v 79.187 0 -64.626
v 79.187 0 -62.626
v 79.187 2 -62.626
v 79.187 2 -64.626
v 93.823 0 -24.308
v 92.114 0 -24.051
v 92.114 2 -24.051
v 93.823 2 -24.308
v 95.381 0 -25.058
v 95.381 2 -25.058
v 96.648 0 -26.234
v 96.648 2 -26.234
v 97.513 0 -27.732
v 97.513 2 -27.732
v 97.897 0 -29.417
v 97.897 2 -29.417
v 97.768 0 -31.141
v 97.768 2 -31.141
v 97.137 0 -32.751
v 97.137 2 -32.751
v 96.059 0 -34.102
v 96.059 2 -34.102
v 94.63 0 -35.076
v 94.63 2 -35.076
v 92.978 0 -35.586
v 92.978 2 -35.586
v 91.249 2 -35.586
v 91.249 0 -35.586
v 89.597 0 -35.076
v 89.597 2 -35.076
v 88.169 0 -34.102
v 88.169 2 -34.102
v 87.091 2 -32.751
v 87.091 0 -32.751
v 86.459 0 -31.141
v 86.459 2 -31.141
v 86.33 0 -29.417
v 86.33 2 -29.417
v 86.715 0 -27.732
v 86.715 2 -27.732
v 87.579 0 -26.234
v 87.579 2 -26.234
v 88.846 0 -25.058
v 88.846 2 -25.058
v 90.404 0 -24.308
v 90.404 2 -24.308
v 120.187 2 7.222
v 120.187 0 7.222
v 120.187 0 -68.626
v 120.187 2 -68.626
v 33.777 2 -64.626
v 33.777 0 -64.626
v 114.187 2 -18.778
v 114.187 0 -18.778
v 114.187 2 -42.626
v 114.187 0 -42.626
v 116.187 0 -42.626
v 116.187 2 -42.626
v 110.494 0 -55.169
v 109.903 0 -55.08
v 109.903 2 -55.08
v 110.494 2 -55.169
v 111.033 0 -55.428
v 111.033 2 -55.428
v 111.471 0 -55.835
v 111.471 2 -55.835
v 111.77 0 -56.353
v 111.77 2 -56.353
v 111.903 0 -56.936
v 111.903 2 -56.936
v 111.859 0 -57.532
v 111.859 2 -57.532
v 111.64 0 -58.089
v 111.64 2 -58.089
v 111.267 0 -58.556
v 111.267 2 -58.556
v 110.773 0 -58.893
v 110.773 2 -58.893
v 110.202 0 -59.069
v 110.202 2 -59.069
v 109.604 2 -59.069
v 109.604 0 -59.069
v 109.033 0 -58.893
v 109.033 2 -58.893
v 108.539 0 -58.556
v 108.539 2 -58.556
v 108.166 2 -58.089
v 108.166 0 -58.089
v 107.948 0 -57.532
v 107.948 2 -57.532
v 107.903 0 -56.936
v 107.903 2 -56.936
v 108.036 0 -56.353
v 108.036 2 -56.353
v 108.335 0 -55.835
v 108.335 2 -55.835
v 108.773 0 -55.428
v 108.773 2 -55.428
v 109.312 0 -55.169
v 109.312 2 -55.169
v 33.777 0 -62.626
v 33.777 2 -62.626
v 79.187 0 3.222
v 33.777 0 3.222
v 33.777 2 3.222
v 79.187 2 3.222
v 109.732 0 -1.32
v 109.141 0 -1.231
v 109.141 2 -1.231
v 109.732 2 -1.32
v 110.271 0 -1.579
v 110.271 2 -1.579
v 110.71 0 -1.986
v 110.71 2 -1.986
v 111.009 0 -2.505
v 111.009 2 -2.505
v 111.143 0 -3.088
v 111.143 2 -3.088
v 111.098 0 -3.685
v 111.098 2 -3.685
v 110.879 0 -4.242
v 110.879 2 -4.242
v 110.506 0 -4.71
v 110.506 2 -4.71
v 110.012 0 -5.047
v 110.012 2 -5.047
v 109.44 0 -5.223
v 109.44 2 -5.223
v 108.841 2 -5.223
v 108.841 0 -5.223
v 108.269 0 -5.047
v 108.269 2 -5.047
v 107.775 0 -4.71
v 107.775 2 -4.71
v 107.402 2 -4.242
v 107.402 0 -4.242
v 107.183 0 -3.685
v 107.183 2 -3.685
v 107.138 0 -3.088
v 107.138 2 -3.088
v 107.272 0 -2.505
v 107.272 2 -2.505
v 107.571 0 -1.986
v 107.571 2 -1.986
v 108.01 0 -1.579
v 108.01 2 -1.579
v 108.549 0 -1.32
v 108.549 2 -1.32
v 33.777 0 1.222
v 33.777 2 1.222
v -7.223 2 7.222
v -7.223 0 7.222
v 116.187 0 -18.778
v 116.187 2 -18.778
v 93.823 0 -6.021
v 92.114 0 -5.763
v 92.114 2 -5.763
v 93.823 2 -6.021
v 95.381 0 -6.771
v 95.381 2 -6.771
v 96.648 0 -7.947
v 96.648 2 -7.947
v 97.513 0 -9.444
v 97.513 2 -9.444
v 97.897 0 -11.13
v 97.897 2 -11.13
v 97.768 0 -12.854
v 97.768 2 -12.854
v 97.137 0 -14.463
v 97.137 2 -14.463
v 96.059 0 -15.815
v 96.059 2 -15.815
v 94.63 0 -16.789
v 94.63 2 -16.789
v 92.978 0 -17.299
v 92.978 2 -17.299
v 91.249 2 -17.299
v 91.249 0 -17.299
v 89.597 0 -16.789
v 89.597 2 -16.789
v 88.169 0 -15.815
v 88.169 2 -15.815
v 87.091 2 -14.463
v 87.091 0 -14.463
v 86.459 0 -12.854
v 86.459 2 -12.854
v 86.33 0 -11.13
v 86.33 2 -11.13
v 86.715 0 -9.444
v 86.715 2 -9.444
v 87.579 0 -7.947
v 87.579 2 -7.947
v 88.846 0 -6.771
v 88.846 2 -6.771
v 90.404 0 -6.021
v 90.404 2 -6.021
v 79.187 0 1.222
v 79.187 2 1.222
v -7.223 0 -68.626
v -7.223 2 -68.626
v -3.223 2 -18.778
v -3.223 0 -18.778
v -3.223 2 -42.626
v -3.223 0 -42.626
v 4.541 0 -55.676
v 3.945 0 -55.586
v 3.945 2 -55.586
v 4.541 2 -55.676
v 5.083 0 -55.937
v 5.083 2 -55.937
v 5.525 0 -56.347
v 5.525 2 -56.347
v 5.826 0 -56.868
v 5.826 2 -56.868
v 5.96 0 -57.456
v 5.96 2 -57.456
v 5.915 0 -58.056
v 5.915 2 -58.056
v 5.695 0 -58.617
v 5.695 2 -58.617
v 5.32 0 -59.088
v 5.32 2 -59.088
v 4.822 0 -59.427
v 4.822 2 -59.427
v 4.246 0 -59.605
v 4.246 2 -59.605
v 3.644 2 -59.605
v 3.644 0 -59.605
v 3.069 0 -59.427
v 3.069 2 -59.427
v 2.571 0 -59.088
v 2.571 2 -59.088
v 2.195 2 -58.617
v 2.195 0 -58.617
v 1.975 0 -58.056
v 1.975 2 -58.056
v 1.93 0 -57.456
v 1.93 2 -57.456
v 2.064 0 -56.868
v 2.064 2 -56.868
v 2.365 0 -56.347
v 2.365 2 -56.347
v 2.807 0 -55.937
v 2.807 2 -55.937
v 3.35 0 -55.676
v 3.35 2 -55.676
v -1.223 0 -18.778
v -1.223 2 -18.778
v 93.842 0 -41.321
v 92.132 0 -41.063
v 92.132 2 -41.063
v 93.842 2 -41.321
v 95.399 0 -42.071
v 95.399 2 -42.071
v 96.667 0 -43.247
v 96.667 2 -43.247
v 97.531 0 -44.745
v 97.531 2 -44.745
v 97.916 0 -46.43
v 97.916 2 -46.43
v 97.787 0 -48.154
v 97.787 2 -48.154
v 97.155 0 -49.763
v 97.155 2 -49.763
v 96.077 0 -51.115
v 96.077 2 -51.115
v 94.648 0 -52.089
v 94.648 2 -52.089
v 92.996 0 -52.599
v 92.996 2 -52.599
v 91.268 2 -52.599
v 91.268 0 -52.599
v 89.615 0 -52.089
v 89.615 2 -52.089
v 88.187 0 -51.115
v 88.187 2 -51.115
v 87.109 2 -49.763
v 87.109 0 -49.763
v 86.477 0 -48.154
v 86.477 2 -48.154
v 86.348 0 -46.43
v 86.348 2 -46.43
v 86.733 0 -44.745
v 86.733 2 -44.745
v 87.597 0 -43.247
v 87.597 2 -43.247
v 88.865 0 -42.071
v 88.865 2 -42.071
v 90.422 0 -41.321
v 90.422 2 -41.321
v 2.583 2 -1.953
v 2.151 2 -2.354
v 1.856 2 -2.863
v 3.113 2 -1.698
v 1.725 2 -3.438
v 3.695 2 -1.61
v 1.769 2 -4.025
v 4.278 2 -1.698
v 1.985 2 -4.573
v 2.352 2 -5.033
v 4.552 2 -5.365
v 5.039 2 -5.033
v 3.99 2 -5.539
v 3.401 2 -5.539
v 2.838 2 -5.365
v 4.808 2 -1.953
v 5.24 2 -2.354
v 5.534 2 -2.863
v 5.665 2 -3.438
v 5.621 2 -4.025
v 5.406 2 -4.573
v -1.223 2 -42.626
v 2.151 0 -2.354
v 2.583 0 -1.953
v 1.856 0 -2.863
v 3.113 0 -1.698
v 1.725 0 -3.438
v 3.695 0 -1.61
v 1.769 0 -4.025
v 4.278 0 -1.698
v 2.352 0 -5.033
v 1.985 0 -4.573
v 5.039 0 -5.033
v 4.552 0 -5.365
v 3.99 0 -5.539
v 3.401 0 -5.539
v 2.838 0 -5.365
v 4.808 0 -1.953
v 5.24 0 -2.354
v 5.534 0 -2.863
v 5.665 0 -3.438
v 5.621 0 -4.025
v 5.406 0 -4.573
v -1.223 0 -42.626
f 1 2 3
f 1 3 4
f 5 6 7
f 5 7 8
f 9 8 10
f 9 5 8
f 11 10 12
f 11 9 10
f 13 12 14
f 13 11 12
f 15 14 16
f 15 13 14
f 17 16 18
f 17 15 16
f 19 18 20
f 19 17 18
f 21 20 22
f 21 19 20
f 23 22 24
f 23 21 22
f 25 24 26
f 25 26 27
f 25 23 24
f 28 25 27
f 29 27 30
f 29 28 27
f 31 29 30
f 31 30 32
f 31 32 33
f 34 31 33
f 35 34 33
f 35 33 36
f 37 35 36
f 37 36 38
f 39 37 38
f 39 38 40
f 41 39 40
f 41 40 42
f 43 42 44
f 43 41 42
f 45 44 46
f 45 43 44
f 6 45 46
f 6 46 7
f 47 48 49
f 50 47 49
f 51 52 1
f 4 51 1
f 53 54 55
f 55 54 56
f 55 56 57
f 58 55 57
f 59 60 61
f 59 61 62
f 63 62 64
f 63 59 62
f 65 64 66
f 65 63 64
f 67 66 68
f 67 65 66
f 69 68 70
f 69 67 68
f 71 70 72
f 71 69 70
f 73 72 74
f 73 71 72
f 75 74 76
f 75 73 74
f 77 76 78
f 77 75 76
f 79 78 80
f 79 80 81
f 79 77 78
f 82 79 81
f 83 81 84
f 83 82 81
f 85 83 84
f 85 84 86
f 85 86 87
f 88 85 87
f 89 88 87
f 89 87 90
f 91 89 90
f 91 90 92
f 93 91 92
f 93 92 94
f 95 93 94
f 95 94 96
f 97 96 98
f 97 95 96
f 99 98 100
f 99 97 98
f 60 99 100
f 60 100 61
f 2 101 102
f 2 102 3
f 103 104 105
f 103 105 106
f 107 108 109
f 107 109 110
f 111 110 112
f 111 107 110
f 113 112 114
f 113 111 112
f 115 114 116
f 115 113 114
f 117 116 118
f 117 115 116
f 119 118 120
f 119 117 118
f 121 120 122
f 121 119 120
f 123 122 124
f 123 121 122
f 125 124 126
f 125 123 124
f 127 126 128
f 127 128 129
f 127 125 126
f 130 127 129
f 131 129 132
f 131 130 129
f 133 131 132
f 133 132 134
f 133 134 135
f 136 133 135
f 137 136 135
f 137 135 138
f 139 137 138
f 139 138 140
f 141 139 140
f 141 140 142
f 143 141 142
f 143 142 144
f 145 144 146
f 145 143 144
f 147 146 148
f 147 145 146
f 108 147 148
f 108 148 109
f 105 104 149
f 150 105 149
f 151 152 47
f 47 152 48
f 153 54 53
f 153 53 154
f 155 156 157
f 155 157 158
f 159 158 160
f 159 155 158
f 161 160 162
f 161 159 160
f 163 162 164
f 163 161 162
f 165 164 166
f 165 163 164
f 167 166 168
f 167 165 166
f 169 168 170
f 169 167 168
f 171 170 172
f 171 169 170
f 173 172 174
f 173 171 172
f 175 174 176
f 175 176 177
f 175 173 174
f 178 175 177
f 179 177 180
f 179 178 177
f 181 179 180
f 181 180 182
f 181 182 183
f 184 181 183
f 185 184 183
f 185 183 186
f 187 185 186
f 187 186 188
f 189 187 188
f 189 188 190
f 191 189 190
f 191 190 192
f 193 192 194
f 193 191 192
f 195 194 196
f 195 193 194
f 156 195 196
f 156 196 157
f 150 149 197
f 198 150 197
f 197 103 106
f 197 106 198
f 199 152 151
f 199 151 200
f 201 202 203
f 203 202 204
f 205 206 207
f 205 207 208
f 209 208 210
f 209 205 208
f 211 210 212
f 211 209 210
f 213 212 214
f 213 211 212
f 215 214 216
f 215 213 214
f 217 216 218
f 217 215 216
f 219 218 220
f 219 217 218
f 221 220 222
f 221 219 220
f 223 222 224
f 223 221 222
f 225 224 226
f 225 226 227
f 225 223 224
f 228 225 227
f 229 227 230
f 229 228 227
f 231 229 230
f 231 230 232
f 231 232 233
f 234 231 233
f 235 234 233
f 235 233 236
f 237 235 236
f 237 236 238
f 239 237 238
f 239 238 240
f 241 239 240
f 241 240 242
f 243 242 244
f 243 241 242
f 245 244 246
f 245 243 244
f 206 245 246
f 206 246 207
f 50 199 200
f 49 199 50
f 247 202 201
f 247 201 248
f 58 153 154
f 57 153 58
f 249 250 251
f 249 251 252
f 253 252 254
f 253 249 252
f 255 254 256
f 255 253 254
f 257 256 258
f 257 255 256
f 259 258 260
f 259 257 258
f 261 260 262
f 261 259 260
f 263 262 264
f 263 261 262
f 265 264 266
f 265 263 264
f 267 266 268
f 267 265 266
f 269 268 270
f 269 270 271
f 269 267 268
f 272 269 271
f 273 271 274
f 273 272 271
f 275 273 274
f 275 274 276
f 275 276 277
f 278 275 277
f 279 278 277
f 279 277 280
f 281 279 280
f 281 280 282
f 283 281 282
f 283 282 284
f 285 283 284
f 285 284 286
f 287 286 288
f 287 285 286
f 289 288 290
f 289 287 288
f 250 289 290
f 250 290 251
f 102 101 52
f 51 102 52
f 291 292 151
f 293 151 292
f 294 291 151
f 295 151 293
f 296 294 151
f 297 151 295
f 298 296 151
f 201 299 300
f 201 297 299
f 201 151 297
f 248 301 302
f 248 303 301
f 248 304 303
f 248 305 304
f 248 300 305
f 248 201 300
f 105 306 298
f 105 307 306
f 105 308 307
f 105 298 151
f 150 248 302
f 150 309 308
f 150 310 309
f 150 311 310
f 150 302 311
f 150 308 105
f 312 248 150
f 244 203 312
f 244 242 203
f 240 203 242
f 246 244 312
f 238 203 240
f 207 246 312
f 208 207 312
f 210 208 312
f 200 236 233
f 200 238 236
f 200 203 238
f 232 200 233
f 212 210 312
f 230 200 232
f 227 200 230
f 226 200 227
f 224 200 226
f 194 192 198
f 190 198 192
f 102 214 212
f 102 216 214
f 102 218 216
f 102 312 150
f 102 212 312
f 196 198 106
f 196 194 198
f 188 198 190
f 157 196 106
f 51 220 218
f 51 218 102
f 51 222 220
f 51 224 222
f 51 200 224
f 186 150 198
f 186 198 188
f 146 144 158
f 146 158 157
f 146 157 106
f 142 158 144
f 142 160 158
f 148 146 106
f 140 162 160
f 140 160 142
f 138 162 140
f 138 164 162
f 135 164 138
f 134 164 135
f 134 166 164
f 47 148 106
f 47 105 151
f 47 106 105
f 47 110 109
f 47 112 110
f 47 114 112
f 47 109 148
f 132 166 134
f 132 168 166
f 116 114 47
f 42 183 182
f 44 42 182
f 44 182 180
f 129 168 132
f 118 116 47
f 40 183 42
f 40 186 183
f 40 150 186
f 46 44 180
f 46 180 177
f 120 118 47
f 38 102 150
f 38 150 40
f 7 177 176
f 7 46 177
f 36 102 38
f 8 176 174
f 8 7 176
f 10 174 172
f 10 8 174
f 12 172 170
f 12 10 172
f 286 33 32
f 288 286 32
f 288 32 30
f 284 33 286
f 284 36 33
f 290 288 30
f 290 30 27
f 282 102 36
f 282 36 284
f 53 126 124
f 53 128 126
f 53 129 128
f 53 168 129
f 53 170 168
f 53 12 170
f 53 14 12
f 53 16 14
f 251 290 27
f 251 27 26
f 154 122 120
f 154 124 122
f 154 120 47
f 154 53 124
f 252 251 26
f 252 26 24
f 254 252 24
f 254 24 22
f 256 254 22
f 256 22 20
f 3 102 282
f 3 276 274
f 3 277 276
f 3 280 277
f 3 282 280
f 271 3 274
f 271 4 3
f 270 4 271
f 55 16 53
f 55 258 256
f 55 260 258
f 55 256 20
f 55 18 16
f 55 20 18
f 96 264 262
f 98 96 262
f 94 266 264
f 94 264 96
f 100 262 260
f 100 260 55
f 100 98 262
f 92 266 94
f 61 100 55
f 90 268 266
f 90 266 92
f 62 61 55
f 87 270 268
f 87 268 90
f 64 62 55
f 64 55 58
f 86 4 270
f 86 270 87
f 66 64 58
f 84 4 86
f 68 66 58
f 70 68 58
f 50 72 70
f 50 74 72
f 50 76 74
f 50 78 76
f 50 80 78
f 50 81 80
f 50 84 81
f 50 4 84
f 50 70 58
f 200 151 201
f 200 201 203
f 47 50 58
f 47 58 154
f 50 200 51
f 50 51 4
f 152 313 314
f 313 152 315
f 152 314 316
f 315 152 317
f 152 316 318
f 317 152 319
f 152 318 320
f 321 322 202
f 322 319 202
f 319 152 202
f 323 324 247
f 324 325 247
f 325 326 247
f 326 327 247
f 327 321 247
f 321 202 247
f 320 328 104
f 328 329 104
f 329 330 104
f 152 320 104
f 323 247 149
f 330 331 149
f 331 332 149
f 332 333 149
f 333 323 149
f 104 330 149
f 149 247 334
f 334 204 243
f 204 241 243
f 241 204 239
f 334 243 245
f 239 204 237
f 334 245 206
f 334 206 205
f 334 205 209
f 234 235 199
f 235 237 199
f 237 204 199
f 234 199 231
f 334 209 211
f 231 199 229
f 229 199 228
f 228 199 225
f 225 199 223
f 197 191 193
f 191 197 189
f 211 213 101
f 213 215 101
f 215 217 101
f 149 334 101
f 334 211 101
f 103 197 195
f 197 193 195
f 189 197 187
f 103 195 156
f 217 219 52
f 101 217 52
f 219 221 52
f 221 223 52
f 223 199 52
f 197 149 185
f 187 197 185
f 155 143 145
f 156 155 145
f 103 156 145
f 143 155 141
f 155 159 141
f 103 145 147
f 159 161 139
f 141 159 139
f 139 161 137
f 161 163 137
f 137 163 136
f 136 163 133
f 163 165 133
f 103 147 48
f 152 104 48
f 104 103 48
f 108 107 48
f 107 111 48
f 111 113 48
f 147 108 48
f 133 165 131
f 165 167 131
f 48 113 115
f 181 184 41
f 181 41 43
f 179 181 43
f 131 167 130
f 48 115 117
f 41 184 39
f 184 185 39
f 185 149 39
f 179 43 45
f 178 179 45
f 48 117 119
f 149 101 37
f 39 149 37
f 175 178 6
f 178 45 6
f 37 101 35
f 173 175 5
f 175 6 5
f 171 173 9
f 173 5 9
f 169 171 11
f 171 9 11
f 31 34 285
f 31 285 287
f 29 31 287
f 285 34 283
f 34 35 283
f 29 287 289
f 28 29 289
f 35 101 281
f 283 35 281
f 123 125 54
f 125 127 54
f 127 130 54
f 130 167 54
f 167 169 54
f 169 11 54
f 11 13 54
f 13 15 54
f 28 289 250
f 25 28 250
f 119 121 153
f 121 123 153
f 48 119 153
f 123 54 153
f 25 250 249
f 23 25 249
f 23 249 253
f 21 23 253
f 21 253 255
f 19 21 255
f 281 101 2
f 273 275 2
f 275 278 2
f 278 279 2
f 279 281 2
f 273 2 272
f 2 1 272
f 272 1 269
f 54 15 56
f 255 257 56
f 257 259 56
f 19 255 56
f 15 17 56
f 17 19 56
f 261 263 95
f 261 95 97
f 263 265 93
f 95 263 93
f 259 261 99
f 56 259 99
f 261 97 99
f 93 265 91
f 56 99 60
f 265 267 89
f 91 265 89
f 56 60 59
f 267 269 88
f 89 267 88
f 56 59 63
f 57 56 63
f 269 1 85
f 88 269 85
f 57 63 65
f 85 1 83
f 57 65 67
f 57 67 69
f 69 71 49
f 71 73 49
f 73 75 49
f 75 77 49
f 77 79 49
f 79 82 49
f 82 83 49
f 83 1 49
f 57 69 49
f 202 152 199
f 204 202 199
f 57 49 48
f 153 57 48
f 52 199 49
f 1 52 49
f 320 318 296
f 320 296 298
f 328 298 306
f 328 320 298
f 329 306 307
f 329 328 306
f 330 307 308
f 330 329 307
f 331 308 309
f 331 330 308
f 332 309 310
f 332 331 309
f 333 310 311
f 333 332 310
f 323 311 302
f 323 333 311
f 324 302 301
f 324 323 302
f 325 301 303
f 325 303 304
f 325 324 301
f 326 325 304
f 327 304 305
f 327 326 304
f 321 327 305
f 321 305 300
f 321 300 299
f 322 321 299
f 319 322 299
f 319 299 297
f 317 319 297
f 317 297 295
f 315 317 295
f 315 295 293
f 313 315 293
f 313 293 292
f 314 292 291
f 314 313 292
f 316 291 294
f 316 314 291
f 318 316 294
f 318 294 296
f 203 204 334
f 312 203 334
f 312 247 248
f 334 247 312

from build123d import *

# Parameters (mm, degrees)
SKETCH2_W           = 127.41
SKETCH2_H           = 75.848
SKETCH2_R           = 5.8
SKETCH2_R_2         = 1.975434392
SKETCH2_R_3         = 2.02059866
SKETCH2_R_4         = 2.005784304
SKETCH2_R_5         = 2.007647525
SKETCH2_W_2         = 2
SKETCH2_H_2         = 23.848
SKETCH2_W_3         = 45.41
SKETCH2_H_3         = 2
BOSS_EXTRUDE1_DEPTH = 2


with BuildPart() as part:
    # Sketch2 → Boss-Extrude1 (new body)
    with BuildSketch(Plane(origin=(0, 0, 0), x_dir=(1, 0, 0), z_dir=(0, 1, 0))):
        with Locations((56.48154317, 30.702122774)):
            Rectangle(SKETCH2_W, SKETCH2_H)
        with Locations(Location((92.113682499, 29.850625922, 0), (0, 0, 270))):
            Circle(SKETCH2_R, mode=Mode.SUBTRACT)
        with Locations(Location((92.113682499, 11.563322273, 0), (0, 0, 270))):
            Circle(SKETCH2_R, mode=Mode.SUBTRACT)
        with Locations(Location((92.131948628, 46.863483745, 0), (0, 0, 270))):
            Circle(SKETCH2_R, mode=Mode.SUBTRACT)
        with Locations(Location((3.695346689, 3.585176853, 0), (0, 0, 270))):
            Circle(SKETCH2_R_2, mode=Mode.SUBTRACT)
        with Locations(Location((3.945209928, 57.606557407, 0), (0, 0, 270))):
            Circle(SKETCH2_R_3, mode=Mode.SUBTRACT)
        with Locations(Location((109.903070514, 57.08563935, 0), (0, 0, 270))):
            Circle(SKETCH2_R_4, mode=Mode.SUBTRACT)
        with Locations(Location((109.140500171, 3.238215507, 0), (0, 0, 270))):
            Circle(SKETCH2_R_5, mode=Mode.SUBTRACT)
        with Locations((-2.22345683, 30.702122774)):
            Rectangle(SKETCH2_W_2, SKETCH2_H_2, mode=Mode.SUBTRACT)
        with Locations((56.48154317, 63.626122774)):
            Rectangle(SKETCH2_W_3, SKETCH2_H_3, mode=Mode.SUBTRACT)
        with Locations((115.18654317, 30.702122774)):
            Rectangle(SKETCH2_W_2, SKETCH2_H_2, mode=Mode.SUBTRACT)
        with Locations((56.48154317, -2.221877226)):
            Rectangle(SKETCH2_W_3, SKETCH2_H_3, mode=Mode.SUBTRACT)
    extrude(amount=BOSS_EXTRUDE1_DEPTH)


solid = part.part
